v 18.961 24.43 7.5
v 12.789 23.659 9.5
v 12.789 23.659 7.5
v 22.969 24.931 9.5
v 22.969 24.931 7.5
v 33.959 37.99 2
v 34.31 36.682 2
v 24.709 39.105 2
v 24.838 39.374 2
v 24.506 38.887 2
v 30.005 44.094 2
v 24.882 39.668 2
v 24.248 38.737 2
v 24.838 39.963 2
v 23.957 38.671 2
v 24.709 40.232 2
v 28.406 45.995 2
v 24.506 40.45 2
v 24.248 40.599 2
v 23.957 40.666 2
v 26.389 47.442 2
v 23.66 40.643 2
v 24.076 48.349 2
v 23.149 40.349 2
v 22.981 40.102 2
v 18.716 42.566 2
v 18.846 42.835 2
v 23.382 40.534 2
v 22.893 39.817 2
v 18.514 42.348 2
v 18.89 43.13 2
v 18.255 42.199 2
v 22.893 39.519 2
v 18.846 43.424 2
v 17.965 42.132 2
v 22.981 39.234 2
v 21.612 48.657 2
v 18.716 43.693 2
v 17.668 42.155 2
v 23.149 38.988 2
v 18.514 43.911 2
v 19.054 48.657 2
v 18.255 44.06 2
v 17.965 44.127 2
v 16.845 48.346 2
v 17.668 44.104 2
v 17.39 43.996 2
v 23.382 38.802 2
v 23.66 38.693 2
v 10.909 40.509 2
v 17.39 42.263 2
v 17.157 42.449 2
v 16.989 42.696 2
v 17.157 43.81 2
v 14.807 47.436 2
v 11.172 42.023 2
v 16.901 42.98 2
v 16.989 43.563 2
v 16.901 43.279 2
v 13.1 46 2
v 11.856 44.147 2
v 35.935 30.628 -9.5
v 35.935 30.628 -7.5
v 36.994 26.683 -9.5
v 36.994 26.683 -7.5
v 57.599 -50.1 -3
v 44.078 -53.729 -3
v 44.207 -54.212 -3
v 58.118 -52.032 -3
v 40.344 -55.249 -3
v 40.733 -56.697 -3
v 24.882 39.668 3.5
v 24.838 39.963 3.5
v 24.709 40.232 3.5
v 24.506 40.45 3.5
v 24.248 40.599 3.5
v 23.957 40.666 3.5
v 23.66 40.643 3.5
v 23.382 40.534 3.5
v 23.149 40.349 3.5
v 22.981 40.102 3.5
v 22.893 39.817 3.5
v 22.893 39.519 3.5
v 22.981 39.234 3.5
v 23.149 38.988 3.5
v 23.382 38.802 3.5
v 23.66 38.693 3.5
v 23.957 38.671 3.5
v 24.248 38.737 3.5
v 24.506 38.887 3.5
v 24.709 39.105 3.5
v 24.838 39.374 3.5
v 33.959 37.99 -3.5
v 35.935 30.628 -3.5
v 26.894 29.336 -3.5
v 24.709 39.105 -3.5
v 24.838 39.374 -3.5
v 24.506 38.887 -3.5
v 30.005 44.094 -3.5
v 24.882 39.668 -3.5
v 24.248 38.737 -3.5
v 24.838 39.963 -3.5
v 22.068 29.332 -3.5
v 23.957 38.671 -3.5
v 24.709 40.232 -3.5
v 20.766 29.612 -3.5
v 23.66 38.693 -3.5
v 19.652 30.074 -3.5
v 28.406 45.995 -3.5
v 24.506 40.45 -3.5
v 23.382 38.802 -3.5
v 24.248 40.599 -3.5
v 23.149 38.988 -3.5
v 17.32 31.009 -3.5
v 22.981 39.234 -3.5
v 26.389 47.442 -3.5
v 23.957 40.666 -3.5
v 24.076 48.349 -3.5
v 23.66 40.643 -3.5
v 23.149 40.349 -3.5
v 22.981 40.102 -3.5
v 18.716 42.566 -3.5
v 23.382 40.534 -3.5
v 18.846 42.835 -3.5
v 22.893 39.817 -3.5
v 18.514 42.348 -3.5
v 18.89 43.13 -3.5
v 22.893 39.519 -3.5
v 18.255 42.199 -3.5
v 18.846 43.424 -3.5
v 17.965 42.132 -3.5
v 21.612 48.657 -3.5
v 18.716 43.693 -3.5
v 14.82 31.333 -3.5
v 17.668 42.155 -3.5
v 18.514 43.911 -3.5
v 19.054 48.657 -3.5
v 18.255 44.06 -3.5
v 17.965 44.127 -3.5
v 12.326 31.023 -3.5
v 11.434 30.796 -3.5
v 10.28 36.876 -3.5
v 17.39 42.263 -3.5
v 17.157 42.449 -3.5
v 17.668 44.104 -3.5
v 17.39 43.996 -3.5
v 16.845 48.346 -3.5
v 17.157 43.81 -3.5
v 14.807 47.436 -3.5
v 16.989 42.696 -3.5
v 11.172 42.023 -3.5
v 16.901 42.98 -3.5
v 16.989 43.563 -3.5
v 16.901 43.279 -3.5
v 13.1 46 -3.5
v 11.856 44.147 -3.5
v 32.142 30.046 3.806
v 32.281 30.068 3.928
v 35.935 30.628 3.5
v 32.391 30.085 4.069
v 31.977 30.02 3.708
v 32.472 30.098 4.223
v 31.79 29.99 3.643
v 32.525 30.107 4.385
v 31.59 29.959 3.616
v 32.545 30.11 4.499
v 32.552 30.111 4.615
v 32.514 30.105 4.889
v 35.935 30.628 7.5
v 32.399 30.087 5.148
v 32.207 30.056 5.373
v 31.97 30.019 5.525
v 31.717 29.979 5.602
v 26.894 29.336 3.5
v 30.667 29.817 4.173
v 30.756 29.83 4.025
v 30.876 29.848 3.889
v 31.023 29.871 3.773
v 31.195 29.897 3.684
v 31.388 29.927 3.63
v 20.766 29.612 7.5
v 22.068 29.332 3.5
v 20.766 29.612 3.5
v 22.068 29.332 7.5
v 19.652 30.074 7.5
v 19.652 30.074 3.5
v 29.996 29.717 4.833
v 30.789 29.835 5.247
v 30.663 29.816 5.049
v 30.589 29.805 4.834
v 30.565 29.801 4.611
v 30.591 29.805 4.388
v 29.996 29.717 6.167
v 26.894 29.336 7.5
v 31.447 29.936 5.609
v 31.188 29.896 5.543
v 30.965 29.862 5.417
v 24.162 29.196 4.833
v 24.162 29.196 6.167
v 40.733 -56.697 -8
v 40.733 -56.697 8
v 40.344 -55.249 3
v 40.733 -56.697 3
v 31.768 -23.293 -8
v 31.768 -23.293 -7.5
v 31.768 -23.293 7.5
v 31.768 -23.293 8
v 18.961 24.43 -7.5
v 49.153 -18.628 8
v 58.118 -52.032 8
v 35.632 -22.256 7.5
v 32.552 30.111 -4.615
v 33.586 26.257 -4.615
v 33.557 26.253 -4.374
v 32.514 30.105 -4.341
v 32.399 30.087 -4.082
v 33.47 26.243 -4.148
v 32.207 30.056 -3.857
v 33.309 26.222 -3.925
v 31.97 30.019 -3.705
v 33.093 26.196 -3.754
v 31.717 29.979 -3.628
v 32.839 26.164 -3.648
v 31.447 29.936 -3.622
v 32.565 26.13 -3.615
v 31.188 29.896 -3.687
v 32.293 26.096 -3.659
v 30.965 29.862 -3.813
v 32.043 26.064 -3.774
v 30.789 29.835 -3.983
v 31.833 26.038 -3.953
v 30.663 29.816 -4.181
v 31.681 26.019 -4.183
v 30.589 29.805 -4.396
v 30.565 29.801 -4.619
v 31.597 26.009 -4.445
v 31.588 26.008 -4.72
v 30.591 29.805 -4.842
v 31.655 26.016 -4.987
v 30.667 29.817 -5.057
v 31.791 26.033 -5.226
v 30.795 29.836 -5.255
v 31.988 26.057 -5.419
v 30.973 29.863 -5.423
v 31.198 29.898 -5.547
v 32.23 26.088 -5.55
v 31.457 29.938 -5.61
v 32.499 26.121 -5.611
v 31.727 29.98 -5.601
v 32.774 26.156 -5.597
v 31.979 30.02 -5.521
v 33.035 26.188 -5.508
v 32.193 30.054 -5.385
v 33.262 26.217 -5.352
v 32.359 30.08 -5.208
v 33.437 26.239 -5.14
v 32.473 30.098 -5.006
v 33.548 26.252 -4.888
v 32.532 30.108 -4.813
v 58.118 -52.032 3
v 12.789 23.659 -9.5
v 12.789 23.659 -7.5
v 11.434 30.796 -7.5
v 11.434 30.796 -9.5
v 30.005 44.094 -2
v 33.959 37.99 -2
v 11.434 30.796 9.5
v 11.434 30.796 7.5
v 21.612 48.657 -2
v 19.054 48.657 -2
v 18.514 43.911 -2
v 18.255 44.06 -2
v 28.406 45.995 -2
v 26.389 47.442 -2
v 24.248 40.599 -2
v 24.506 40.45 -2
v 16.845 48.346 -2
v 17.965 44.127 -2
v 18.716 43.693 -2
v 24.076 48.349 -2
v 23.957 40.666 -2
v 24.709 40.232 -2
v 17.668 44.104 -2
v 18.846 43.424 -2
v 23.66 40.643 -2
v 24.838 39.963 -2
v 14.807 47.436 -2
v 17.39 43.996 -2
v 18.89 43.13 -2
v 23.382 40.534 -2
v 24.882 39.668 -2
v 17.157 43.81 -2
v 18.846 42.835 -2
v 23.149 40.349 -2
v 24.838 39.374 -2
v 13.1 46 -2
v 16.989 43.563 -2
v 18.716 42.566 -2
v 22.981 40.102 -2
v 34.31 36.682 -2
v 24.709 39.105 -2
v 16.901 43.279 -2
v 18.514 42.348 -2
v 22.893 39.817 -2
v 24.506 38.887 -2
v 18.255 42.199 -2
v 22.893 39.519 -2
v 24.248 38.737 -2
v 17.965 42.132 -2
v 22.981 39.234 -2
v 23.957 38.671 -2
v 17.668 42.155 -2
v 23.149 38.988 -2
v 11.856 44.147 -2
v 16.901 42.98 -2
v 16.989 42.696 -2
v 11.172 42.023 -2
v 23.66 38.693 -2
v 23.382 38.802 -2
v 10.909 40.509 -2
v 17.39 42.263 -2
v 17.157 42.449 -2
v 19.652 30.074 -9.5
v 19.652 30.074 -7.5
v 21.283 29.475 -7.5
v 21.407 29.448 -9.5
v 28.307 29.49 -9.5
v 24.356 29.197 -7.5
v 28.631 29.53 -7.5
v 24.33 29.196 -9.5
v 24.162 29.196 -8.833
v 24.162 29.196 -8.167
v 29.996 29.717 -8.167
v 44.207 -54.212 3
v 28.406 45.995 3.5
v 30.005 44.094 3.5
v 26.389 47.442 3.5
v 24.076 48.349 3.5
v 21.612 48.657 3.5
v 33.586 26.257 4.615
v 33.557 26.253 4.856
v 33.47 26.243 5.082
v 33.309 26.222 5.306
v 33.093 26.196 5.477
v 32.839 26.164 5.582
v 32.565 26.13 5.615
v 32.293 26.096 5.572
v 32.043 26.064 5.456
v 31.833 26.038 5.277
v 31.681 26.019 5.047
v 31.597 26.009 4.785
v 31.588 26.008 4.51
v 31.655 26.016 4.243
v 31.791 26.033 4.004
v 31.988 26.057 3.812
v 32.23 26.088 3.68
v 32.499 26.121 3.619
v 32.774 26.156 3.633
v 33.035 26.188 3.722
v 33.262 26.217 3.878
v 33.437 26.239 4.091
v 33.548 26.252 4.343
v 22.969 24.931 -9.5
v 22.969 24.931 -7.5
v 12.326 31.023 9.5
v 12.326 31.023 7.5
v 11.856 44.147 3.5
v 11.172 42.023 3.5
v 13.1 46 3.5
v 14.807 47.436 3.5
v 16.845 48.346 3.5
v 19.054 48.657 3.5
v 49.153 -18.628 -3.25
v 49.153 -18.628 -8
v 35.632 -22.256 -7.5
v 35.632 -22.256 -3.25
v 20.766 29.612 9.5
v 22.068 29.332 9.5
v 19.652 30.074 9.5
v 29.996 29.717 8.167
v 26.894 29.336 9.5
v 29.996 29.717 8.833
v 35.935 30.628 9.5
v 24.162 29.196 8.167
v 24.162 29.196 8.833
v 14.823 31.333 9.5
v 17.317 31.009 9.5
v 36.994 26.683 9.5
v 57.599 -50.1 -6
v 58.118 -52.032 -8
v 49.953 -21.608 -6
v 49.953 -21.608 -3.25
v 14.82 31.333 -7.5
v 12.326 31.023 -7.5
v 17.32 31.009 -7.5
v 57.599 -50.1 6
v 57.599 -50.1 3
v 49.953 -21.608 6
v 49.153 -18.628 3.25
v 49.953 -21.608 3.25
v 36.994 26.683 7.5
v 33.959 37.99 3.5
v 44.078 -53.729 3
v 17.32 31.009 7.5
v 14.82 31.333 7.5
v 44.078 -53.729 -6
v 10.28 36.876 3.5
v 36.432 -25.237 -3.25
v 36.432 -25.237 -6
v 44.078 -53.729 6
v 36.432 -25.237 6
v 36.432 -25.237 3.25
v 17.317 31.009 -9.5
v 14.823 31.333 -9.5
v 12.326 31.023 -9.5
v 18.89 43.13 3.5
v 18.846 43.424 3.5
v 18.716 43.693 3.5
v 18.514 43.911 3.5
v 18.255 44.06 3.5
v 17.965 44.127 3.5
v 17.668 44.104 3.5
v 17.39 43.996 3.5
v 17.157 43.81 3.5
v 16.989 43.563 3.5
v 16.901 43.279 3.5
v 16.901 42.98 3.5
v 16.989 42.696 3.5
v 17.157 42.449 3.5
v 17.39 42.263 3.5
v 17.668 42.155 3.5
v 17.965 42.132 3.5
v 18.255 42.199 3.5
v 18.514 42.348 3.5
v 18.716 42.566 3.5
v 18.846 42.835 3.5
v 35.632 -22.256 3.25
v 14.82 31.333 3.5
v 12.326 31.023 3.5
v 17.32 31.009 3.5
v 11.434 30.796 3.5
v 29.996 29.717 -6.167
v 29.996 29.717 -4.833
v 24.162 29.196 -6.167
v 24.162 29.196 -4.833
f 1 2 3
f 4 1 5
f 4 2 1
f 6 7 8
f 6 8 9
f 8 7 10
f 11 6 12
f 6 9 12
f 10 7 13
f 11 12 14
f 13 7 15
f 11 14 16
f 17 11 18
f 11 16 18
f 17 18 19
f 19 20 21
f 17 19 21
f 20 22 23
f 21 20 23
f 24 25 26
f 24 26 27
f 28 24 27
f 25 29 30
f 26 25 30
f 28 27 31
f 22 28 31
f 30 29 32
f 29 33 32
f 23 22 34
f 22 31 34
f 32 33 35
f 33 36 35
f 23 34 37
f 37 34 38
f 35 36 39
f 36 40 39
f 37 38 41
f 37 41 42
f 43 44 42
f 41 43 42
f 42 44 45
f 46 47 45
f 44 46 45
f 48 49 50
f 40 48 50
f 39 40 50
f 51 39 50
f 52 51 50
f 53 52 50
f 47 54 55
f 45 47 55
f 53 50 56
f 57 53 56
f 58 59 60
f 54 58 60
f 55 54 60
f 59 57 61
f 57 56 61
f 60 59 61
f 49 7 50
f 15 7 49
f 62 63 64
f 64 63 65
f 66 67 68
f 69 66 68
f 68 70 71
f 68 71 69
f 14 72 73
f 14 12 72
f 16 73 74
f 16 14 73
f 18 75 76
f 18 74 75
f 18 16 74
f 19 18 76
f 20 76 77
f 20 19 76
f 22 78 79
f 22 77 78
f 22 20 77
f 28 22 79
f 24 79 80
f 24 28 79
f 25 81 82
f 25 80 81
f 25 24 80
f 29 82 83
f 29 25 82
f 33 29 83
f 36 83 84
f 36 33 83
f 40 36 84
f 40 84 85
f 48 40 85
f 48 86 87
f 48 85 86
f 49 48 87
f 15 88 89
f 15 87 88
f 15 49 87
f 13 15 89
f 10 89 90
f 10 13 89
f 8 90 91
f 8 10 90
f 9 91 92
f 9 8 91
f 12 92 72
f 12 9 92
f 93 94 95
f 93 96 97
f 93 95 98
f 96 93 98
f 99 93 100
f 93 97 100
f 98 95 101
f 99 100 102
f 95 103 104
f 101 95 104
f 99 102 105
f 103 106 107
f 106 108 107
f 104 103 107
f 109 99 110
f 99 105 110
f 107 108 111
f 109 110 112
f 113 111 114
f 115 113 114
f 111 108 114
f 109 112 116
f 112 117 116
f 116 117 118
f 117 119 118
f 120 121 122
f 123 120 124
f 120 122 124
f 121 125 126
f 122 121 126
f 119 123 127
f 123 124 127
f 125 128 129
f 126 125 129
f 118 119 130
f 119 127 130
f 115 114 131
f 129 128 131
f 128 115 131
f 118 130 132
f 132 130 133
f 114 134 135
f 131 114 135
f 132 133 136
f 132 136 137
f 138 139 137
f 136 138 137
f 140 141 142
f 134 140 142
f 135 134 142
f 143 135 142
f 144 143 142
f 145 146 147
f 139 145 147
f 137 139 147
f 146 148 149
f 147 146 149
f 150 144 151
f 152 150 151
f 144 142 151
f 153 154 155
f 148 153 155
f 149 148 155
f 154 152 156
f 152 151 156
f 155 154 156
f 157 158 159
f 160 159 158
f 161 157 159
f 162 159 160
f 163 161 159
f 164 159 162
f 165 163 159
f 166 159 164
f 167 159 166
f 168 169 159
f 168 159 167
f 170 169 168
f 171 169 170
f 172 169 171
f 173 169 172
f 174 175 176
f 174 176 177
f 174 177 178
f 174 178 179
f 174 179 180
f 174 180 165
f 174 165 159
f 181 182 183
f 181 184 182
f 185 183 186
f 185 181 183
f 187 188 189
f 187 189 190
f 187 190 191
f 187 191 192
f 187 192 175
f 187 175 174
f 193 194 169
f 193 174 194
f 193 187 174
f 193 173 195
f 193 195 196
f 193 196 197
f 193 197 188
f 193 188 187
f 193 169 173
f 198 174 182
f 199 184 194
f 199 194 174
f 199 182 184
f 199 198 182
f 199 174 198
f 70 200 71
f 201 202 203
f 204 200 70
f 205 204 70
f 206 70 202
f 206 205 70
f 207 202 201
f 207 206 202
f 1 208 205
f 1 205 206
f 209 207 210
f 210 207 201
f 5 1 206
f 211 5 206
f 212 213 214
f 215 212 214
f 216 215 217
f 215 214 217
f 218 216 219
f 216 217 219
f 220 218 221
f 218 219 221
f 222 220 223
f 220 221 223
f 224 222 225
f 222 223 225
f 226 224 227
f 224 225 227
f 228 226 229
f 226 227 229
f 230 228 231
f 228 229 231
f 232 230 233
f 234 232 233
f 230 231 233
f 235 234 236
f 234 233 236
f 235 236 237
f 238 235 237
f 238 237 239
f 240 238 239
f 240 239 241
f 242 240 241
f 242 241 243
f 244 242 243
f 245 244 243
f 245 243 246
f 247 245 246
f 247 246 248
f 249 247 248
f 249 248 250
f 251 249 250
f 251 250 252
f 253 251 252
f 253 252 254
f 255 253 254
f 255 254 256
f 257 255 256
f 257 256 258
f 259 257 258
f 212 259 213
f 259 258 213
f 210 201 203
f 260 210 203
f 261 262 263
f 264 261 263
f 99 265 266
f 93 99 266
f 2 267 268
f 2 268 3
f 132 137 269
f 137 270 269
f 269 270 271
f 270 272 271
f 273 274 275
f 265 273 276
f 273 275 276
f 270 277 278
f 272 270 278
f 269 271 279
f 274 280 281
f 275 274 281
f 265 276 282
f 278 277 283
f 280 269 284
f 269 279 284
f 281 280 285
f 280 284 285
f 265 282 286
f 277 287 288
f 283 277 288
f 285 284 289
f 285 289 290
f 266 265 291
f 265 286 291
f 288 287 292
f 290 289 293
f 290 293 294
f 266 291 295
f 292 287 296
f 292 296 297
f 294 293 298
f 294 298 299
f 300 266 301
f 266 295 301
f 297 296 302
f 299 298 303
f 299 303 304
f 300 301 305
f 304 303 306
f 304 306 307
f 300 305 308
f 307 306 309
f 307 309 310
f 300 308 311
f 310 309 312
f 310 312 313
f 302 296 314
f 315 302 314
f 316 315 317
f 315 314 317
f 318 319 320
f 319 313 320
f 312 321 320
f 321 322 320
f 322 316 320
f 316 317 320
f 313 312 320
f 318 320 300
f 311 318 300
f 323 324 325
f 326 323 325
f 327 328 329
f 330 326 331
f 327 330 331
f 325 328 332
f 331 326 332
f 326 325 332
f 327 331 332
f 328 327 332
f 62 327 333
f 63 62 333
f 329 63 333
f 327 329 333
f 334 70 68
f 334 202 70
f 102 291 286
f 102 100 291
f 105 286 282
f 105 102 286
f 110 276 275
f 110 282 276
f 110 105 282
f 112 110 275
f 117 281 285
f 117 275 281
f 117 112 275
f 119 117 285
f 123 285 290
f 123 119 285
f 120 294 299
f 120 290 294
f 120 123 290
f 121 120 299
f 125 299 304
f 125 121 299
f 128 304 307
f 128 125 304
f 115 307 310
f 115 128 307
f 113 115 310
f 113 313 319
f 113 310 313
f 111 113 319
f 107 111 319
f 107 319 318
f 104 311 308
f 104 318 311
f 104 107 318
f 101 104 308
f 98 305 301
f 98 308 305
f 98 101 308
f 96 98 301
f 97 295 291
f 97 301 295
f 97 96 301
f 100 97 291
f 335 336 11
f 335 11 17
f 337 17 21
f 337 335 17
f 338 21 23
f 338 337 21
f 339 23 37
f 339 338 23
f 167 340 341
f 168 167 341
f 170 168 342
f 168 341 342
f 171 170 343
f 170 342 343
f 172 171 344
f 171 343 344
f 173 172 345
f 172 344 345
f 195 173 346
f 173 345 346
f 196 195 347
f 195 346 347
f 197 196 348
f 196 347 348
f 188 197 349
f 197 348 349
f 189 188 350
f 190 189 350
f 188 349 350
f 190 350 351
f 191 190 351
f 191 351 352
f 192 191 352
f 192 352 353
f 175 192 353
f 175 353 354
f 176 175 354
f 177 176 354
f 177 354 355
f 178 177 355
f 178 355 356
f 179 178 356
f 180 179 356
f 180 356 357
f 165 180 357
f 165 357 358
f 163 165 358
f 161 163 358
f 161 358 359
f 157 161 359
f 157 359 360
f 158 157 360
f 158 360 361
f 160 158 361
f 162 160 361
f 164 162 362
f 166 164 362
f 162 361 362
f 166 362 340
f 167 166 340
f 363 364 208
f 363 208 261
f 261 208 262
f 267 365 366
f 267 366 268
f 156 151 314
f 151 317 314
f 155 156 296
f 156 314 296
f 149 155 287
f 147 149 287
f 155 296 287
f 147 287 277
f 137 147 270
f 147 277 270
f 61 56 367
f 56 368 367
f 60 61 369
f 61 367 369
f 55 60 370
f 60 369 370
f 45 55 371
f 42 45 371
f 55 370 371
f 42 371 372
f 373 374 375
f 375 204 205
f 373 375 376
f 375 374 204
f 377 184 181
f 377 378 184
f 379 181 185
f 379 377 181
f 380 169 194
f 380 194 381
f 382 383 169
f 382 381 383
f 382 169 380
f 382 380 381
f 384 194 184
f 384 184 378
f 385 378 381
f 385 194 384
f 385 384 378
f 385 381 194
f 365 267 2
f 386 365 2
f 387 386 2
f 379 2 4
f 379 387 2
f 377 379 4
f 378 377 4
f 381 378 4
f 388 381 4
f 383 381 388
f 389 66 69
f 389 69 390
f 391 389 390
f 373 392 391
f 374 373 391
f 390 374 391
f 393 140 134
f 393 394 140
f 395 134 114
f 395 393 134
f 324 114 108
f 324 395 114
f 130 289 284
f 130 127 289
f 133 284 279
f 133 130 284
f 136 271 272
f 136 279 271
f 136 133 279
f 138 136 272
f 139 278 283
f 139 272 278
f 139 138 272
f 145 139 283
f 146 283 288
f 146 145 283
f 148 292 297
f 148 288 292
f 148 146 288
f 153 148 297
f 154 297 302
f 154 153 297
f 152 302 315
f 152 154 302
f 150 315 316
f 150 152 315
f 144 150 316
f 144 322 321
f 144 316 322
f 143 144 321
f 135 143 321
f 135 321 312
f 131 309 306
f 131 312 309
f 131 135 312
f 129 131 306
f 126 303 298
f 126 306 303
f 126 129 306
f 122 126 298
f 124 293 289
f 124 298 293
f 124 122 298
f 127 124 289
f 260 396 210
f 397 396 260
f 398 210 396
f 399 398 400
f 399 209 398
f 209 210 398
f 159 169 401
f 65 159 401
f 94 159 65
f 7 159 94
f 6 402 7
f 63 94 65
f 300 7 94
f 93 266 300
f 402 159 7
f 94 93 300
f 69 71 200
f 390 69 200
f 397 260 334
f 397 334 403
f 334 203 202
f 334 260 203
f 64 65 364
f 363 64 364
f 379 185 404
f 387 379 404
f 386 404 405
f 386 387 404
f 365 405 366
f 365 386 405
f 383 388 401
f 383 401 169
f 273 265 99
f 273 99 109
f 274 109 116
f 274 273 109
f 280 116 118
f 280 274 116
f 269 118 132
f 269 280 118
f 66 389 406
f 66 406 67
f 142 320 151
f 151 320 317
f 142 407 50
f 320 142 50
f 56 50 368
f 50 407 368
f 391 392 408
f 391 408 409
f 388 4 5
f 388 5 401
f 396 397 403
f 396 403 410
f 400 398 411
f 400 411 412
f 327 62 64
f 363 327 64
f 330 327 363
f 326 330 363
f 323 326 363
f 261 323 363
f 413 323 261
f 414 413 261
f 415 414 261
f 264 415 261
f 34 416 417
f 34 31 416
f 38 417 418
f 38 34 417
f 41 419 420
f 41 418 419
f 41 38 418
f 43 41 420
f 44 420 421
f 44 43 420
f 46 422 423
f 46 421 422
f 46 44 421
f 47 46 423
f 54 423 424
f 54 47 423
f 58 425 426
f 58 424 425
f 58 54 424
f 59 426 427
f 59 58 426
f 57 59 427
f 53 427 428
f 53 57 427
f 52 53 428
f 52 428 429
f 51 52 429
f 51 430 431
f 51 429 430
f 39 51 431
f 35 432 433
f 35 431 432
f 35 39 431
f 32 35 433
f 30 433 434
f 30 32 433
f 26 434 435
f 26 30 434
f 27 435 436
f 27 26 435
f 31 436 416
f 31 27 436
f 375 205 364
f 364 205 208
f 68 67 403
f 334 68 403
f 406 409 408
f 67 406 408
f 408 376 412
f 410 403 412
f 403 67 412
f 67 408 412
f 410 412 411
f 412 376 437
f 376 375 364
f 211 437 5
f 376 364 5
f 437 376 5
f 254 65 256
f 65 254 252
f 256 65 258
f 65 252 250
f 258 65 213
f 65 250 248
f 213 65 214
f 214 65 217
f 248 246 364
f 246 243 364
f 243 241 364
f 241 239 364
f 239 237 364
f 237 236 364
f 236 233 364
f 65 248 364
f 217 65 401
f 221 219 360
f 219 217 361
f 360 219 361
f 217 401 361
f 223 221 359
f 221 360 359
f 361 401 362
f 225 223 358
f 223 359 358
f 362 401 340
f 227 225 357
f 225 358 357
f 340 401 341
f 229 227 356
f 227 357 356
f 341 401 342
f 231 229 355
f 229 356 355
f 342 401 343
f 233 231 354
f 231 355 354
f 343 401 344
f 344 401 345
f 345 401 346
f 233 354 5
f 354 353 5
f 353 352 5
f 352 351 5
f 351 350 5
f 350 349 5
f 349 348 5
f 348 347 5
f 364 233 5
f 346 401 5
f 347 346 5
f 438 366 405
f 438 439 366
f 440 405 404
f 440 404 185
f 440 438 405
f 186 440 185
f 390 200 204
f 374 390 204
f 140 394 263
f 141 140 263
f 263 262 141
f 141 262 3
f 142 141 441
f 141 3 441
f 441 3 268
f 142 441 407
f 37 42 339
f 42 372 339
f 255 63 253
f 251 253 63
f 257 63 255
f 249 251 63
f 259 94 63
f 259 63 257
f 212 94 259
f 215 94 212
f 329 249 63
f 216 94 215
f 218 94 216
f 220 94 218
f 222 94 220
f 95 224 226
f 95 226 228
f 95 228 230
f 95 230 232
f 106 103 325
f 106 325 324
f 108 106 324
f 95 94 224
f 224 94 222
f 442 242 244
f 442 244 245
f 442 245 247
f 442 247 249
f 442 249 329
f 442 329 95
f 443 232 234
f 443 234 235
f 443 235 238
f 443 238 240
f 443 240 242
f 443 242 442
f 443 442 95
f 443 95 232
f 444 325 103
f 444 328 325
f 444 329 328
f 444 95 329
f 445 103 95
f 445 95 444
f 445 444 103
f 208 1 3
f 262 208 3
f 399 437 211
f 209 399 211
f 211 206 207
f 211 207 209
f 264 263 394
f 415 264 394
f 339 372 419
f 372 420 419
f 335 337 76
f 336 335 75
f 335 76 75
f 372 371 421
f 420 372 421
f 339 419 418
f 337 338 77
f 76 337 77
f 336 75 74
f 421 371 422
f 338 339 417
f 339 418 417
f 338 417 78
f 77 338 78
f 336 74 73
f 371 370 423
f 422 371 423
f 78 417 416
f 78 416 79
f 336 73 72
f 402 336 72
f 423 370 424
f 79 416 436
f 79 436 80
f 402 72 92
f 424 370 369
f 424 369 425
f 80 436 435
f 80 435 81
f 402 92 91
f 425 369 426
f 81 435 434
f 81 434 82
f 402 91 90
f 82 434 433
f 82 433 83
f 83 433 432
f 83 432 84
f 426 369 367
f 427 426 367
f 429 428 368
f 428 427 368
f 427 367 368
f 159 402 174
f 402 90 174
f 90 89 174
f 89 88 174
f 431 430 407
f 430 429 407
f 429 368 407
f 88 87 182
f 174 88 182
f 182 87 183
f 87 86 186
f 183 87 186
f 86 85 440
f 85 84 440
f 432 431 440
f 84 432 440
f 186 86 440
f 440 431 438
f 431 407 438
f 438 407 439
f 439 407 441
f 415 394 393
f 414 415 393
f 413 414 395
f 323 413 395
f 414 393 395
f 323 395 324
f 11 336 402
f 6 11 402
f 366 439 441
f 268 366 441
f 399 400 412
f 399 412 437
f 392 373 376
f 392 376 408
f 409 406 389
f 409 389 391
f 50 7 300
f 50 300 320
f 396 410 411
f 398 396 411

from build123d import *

# Parameters (mm, degrees)
SKETCH10_R                = 1
BOSS_EXTRUDE5_DEPTH       = 7.5
CUT_EXTRUDE1_DEPTH        = 4
FILLET1_R                 = 10
CUT_EXTRUDE6_START        = -11
CUT_EXTRUDE6_DEPTH        = 10
CUT_EXTRUDE7_DEPTH        = 2
BOSS_EXTRUDE11_DEPTH      = 9
SKETCH28_R                = 1
CUT_EXTRUDE8_DEPTH        = 9
BOSS_EXTRUDE13_DEPTH      = 80
BOSS_EXTRUDE13_DEPTH_BACK = 3
SKETCH30_W                = 4
SKETCH30_H                = 15
BOSS_EXTRUDE14_DEPTH      = 14
BOSS_EXTRUDE14_DEPTH_BACK = 4
CUT_EXTRUDE9_DEPTH        = 9
FILLET2_R                 = 8
FILLET3_R                 = 10
BOSS_EXTRUDE15_DEPTH      = 2
BOSS_EXTRUDE16_START      = 2
BOSS_EXTRUDE16_DEPTH      = 2


with BuildPart() as part:
    # Sketch10 → Boss-Extrude5 (new, symmetric)
    with BuildSketch(Plane.XY):
        Polygon((27.048887868, 48.656944563), (33.959433176, 37.989988632), (36.993816658, 26.682834617), (12.788755024, 23.658848526), (10.279677841, 36.875809012), (12.321789019, 48.656944563), align=None)
        with Locations((17.890076876, 43.12952492)):
            Circle(SKETCH10_R, mode=Mode.SUBTRACT)
        with Locations((23.882298789, 39.668364252)):
            Circle(SKETCH10_R, mode=Mode.SUBTRACT)
    extrude(amount=BOSS_EXTRUDE5_DEPTH, both=True)

    # Sketch11 → Cut-Extrude1 (cut)
    with BuildSketch(Plane.XY.offset(7.5)):
        with BuildLine():
            Line((17.825431655, 32.423947427), (9.123881611, 30.207909529))
            Line((9.123881611, 30.207909529), (6.594316119, 53.15991455))
            Line((6.594316119, 53.15991455), (34.693470887, 60.271659822))
            Line((34.693470887, 60.271659822), (37.752907488, 30.846026516))
            add(Edge.make_bspline(
                [(37.752907488, 30.846026516), (30.679137573, 30.15507536), (19.269012528, 26.734198276), (17.825431655, 32.423947427)],
                knots=[0, 0, 0, 0, 1, 1, 1, 1], degree=3))
        make_face()
    extrude(amount=-CUT_EXTRUDE1_DEPTH, mode=Mode.SUBTRACT)

    # Fillet1
    fillet1_edges = [part.edges().sort_by_distance(p)[0] for p in [
        (27.048887868, 48.656944563, -2),
    ]]
    fillet(fillet1_edges, radius=FILLET1_R)

    # Sketch11<2> → Cut-Extrude6 (cut)
    with BuildSketch(Plane.XY.offset(7.5).offset(CUT_EXTRUDE6_START)):
        with BuildLine():
            Line((17.825431655, 32.423947427), (9.123881611, 30.207909529))
            Line((9.123881611, 30.207909529), (6.594316119, 53.15991455))
            Line((6.594316119, 53.15991455), (34.693470887, 60.271659822))
            Line((34.693470887, 60.271659822), (37.752907488, 30.846026516))
            add(Edge.make_bspline(
                [(37.752907488, 30.846026516), (30.679137573, 30.15507536), (19.269012528, 26.734198276), (17.825431655, 32.423947427)],
                knots=[0, 0, 0, 0, 1, 1, 1, 1], degree=3))
        make_face()
    extrude(amount=-CUT_EXTRUDE6_DEPTH, mode=Mode.SUBTRACT)

    # Sketch16 → Cut-Extrude7 (cut, symmetric)
    with BuildSketch(Plane.XY):
        Polygon((10.074284509, 54.36084815), (34.418624568, 54.36084815), (34.418624568, 36.664364271), (10.074284509, 40.645108775), align=None)
    extrude(amount=CUT_EXTRUDE7_DEPTH, both=True, mode=Mode.SUBTRACT)

    # Sketch26 → Boss-Extrude11 (add)
    with BuildSketch(Plane(origin=(41.188168375, 11.053240949, 0), x_dir=(0, 0, -1), z_dir=(0.9658266565657433, 0.2591888683316433, 0))):
        Polygon((2, 27.88983665), (2, 26.535626274), (-2, 26.535626274), (-2, 27.88983665), (-3.5, 27.88983665), (-3.5, 20.267140373), (-7.5, 20.267140373), (-7.5, 16.182607471), (7.5, 16.182607471), (7.5, 20.267140372), (3.5, 20.267140373), (3.5, 27.88983665), align=None)
    extrude(amount=BOSS_EXTRUDE11_DEPTH)

    # Sketch28 → Cut-Extrude8 (cut)
    with BuildSketch(Plane(origin=(-4.194351717, 15.629593668, 0), x_dir=(0.9658266565657433, 0.25918886833164334, 0), z_dir=(0.25918886833164334, -0.9658266565657433, 0))):
        with Locations((38.244135106, 4.615132599)):
            Circle(SKETCH28_R)
        with Locations((38.244135106, -4.615132599)):
            Circle(SKETCH28_R)
    extrude(amount=-CUT_EXTRUDE8_DEPTH, mode=Mode.SUBTRACT)

    # Sketch30 → Boss-Extrude13 (add, two sides: drawn at the far end of the back side and taken through both)
    with BuildSketch(Plane(origin=(-4.194351717, 15.629593668, 0), x_dir=(0.9658266565657433, 0.25918886833164334, 0), z_dir=(0.25918886833164334, -0.9658266565657433, 0)).offset(-BOSS_EXTRUDE13_DEPTH_BACK)):
        with Locations((26.645507965, 0)):
            Rectangle(SKETCH30_W, SKETCH30_H)
    extrude(amount=BOSS_EXTRUDE13_DEPTH + BOSS_EXTRUDE13_DEPTH_BACK)

    # Sketch31 → Boss-Extrude14 (add, two sides: drawn at the far end of the back side and taken through both)
    with BuildSketch(Plane(origin=(27.666595183, 7.424596792, 0), x_dir=(0, 0, -1), z_dir=(0.9658266565657432, 0.2591888683316434, 0)).offset(-BOSS_EXTRUDE14_DEPTH_BACK)):
        Polygon((-3.25, -30.731166129), (-8, -30.731166129), (-8, -65.317392529), (-3, -65.317392529), (-3, -63.317392529), (-6, -63.317392529), (-6, -33.817392529), (-3.25, -33.817392529), align=None)
        Polygon((3, -63.317392529), (3, -65.317392529), (8, -65.317392529), (8, -30.731166129), (3.25, -30.731166129), (3.25, -33.817392529), (6, -33.817392529), (6, -63.317392529), align=None)
    extrude(amount=BOSS_EXTRUDE14_DEPTH + BOSS_EXTRUDE14_DEPTH_BACK)

    # Sketch32 → Cut-Extrude9 (cut)
    with BuildSketch(Plane(origin=(49.880608284, 13.385940764, 0), x_dir=(0, 0, -1), z_dir=(0.9658266565657431, 0.25918886833164445, 0))):
        Polygon((3.5, 27.88983665), (2, 27.88983665), (2, 26.535626274), (-2, 26.535626274), (-2, 27.88983665), (-3.5, 27.88983665), (-3.5, 20.267140373), (-7.5, 20.267140373), (-7.5, 16.182607471), (7.5, 16.182607471), (7.5, 20.267140372), (3.5, 20.267140373), align=None)
    extrude(amount=-CUT_EXTRUDE9_DEPTH, mode=Mode.SUBTRACT)

    # Fillet2
    fillet2_edges = [part.edges().sort_by_distance(p)[0] for p in [
        (12.321789019, 48.656944563, 2.75),
        (12.321789019, 48.656944563, -2.75),
    ]]
    fillet(fillet2_edges, radius=FILLET2_R)

    # Fillet3
    fillet3_edges = [part.edges().sort_by_distance(p)[0] for p in [
        (17.825431655, 32.423947427, 5.5),
        (17.825431655, 32.423947427, -5.5),
    ]]
    fillet(fillet3_edges, radius=FILLET3_R)

    # Sketch33 → Boss-Extrude15 (add)
    with BuildSketch(Plane(origin=(0, 0, -7.5), x_dir=(-1, 0, 0), z_dir=(0, 0, -1))):
        with BuildLine():
            Line((-11.433819556, 30.796185182), (-12.326379112, 31.023494775))
            ThreePointArc((-12.326379112, 31.023494775), (-16.080268918, 31.249787506), (-19.652288318, 30.073533078))
            add(Edge.make_bspline(
                [(-19.652288318, 30.073533078), (-23.094178016, 28.160579122), (-30.349802092, 29.858629099), (-35.935151197, 30.627785373)],
                knots=[0.191604014, 0.191604014, 0.191604014, 0.191604014, 0.918085752, 0.918085752, 0.918085752, 0.918085752], degree=3))
            Line((-35.935151197, 30.627785373), (-36.993816658, 26.682834617))
            Line((-36.993816658, 26.682834617), (-22.968678464, 24.93064644))
            Line((-22.968678464, 24.93064644), (-12.788755024, 23.658848526))
            Line((-12.788755024, 23.658848526), (-11.433819556, 30.796185182))
        make_face()
    extrude(amount=BOSS_EXTRUDE15_DEPTH)

    # Sketch34 → Boss-Extrude16 (add)
    with BuildSketch(Plane.XY.offset(7.5).offset(BOSS_EXTRUDE16_START)):
        with BuildLine():
            Line((12.326379112, 31.023494775), (11.433819556, 30.796185182))
            Line((11.433819556, 30.796185182), (12.788755024, 23.658848526))
            Line((12.788755024, 23.658848526), (22.968678464, 24.93064644))
            Line((22.968678464, 24.93064644), (36.993816658, 26.682834617))
            Line((36.993816658, 26.682834617), (35.935151197, 30.627785373))
            add(Edge.make_bspline(
                [(35.935151197, 30.627785373), (30.349802091, 29.858629099), (23.094178016, 28.160579122), (19.652288318, 30.073533078)],
                knots=[0.191604014, 0.191604014, 0.191604014, 0.191604014, 0.918085752, 0.918085752, 0.918085752, 0.918085752], degree=3))
            ThreePointArc((19.652288318, 30.073533078), (16.080268918, 31.249787506), (12.326379112, 31.023494775))
        make_face()
    extrude(amount=-BOSS_EXTRUDE16_DEPTH)


solid = part.part
